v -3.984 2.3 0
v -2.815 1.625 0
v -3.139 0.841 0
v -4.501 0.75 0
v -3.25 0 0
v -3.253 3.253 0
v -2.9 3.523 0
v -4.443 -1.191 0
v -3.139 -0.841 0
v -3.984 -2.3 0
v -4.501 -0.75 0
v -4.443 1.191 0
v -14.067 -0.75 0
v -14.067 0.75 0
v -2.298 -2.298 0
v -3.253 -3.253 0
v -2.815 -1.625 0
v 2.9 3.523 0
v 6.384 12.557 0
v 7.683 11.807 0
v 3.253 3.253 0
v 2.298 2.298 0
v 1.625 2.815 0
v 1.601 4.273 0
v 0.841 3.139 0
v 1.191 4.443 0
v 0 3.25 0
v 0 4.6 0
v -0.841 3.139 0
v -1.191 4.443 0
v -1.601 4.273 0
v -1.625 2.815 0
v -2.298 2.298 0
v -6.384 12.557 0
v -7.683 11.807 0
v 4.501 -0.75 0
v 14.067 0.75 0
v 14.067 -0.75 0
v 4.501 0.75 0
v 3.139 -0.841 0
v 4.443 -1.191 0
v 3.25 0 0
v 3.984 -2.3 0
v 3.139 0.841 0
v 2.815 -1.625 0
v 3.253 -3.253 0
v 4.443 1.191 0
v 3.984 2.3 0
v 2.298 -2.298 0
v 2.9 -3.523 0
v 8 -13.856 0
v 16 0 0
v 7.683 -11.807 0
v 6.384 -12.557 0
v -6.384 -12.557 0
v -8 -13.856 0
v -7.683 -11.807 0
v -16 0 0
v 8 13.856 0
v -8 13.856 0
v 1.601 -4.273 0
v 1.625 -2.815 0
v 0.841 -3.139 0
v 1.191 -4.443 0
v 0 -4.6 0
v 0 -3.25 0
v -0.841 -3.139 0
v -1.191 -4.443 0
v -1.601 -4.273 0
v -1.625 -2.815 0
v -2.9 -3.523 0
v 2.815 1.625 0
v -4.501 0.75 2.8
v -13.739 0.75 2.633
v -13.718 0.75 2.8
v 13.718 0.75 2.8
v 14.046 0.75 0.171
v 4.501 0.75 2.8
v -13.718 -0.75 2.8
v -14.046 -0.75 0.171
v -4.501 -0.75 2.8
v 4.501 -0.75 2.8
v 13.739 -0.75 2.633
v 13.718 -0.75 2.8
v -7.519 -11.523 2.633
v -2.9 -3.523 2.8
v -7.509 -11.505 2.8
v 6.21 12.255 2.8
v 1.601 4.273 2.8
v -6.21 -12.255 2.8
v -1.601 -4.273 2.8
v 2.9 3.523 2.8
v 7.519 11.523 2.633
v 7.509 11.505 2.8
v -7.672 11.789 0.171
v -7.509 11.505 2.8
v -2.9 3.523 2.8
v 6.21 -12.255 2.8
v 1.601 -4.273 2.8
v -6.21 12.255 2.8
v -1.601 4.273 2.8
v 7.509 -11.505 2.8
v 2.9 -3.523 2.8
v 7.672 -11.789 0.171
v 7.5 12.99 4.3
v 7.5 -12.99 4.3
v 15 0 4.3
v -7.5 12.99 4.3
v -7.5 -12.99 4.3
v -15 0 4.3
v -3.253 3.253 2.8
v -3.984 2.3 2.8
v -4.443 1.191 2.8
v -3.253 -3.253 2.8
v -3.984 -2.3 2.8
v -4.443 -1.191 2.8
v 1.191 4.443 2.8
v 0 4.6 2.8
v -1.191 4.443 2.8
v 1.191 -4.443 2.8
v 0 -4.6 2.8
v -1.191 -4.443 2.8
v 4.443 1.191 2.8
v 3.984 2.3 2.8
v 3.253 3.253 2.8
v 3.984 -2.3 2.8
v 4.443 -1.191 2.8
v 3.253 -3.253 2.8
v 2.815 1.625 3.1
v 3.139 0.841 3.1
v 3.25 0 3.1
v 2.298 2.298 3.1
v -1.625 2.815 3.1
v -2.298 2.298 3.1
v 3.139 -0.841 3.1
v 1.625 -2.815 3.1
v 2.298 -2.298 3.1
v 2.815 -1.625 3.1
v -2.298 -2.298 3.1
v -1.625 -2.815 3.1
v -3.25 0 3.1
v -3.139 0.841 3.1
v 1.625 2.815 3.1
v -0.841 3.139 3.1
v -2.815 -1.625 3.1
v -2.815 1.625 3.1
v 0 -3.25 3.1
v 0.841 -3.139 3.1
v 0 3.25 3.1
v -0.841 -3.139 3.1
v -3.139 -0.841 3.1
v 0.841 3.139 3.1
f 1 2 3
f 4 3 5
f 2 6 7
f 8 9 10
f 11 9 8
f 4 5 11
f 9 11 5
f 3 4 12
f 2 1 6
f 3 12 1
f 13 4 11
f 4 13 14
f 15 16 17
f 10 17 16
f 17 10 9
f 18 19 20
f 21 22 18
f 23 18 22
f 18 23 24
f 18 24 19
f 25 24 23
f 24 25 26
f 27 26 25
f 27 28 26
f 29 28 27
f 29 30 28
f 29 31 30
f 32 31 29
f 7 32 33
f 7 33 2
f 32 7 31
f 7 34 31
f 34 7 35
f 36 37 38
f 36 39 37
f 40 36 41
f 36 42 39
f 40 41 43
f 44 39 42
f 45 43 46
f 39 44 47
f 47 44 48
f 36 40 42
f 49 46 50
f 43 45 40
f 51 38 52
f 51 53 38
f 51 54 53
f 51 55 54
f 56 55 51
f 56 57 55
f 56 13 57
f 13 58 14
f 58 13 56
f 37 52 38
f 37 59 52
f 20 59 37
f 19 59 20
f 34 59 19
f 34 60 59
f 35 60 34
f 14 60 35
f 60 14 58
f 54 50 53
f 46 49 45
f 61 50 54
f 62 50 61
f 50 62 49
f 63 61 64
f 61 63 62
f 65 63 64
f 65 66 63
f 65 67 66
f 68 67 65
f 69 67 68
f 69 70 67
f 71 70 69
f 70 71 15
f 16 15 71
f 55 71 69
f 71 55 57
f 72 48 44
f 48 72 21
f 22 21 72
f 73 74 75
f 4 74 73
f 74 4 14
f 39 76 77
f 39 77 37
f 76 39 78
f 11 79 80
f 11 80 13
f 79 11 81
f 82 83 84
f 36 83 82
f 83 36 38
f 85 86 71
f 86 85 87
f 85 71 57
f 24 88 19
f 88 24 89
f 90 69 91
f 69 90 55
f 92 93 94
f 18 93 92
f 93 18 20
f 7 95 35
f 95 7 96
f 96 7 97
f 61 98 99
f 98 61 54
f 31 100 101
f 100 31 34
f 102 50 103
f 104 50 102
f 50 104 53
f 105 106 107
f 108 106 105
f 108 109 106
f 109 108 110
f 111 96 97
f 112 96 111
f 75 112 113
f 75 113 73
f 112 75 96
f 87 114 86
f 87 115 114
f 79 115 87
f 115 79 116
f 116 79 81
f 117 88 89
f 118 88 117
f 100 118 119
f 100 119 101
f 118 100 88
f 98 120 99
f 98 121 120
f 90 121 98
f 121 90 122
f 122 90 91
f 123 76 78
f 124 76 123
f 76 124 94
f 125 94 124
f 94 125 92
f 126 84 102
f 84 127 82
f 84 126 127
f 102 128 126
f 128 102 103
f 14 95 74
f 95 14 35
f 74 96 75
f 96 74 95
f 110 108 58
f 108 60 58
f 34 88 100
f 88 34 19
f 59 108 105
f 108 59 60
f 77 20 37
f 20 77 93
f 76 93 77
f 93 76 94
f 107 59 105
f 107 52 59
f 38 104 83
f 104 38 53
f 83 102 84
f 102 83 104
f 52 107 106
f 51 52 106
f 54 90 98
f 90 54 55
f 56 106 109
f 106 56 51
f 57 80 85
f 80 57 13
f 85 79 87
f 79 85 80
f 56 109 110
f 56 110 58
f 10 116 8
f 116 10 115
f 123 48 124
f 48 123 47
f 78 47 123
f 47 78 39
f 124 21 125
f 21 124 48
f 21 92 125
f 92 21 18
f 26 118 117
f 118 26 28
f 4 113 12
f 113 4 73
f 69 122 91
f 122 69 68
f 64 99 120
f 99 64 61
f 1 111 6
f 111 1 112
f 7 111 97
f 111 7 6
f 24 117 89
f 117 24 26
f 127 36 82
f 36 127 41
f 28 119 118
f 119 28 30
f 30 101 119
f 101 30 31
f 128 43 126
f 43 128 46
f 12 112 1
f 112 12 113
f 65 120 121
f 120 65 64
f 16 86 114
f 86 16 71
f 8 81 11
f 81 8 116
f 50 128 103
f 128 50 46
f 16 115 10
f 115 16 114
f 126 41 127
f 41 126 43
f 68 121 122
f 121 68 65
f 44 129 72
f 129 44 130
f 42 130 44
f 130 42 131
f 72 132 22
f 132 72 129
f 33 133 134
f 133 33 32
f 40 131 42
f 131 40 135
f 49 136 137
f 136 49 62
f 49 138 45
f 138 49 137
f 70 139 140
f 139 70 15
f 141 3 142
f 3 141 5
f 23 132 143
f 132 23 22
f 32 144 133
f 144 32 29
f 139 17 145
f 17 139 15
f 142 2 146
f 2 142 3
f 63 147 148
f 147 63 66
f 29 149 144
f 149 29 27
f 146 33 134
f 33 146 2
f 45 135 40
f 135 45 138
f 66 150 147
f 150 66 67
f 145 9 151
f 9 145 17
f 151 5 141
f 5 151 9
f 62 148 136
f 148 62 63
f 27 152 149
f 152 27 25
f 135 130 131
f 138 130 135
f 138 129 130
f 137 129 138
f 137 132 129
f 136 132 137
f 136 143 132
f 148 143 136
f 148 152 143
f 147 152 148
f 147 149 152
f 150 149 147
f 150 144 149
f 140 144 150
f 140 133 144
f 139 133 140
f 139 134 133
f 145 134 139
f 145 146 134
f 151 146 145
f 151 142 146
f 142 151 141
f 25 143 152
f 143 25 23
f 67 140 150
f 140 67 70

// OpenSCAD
// file: girl_common.scad
// Copyright 2025 Natalie Baker // Apache v2 //

base_size  = 32;
wall_width =  9;

magnet_dia    = 6.2;
magnet_height = 2.8;

lock_height   = 1.9;
lock_depth    = 4.9;
lock_width    = 11;

lock_hole_dia = 2.25;

grid_size   = base_size + 2*wall_width;
grid_diag   = sqrt(2*grid_size*grid_size);
grid_height = max(lock_height, magnet_height)+1.2;

frame_size = 2.4;

module repeat(size, x, y, z, center) {
	off = center 
		? [(x-1)*size[0],(y-1)*size[1],(z-1)*size[2]]/2 
		: [0,0,0];

	for(i = [0 : x-1])
	for(j = [0 : y-1])
	for(k = [0 : z-1])
		translate([
			size[0]*i-off[0],
			size[1]*j-off[1],
			size[2]*k-off[2]
		]) children();
}
// main file
// Copyright 2025 Natalie Baker // Apache v2 //

include<girl_common.scad>;

base_thickness = 1.5;
base_gap       = magnet_height;

base_rad      = base_size/2;
base_rad_top  = (base_size - 2)/2;
base_rad_in   = base_rad_top+(base_rad-base_rad_top)*(base_gap/(base_thickness+base_gap));
 
girl_base();

module girl_base() {
	$fn=24;
	difference() {
		union() {
			_girl_base_part();
			cylinder(d=magnet_dia+2*base_thickness, h=base_gap);
			
			for(i = [0:2])
			rotate(60*i)
			linear_extrude(base_gap)
			square([base_size-1.45*base_thickness,base_thickness], center=true);
		}
		
		_girl_base_magnet_hole();
	}
}

module _girl_base_part() {
	rotate_extrude($fn=6)
	intersection() {
		polygon([ 
			[                  base_rad,                       0],
			[              base_rad_top, base_thickness+base_gap],
			[                        -1, base_thickness+base_gap],
			[                        -1,                base_gap],
			[base_rad_in-base_thickness,                base_gap],
			[base_rad   -base_thickness,                       0],
		]);
		square([base_rad, base_thickness+base_gap]);
	}
}

module _girl_base_magnet_hole(tolerance=0.15) {
	mad_d = magnet_dia+2*tolerance;
	mag_h = magnet_height+2*tolerance;
	
	translate([0,0,-0.05])
	cylinder(d=mad_d, h=mag_h+0.05);
}
